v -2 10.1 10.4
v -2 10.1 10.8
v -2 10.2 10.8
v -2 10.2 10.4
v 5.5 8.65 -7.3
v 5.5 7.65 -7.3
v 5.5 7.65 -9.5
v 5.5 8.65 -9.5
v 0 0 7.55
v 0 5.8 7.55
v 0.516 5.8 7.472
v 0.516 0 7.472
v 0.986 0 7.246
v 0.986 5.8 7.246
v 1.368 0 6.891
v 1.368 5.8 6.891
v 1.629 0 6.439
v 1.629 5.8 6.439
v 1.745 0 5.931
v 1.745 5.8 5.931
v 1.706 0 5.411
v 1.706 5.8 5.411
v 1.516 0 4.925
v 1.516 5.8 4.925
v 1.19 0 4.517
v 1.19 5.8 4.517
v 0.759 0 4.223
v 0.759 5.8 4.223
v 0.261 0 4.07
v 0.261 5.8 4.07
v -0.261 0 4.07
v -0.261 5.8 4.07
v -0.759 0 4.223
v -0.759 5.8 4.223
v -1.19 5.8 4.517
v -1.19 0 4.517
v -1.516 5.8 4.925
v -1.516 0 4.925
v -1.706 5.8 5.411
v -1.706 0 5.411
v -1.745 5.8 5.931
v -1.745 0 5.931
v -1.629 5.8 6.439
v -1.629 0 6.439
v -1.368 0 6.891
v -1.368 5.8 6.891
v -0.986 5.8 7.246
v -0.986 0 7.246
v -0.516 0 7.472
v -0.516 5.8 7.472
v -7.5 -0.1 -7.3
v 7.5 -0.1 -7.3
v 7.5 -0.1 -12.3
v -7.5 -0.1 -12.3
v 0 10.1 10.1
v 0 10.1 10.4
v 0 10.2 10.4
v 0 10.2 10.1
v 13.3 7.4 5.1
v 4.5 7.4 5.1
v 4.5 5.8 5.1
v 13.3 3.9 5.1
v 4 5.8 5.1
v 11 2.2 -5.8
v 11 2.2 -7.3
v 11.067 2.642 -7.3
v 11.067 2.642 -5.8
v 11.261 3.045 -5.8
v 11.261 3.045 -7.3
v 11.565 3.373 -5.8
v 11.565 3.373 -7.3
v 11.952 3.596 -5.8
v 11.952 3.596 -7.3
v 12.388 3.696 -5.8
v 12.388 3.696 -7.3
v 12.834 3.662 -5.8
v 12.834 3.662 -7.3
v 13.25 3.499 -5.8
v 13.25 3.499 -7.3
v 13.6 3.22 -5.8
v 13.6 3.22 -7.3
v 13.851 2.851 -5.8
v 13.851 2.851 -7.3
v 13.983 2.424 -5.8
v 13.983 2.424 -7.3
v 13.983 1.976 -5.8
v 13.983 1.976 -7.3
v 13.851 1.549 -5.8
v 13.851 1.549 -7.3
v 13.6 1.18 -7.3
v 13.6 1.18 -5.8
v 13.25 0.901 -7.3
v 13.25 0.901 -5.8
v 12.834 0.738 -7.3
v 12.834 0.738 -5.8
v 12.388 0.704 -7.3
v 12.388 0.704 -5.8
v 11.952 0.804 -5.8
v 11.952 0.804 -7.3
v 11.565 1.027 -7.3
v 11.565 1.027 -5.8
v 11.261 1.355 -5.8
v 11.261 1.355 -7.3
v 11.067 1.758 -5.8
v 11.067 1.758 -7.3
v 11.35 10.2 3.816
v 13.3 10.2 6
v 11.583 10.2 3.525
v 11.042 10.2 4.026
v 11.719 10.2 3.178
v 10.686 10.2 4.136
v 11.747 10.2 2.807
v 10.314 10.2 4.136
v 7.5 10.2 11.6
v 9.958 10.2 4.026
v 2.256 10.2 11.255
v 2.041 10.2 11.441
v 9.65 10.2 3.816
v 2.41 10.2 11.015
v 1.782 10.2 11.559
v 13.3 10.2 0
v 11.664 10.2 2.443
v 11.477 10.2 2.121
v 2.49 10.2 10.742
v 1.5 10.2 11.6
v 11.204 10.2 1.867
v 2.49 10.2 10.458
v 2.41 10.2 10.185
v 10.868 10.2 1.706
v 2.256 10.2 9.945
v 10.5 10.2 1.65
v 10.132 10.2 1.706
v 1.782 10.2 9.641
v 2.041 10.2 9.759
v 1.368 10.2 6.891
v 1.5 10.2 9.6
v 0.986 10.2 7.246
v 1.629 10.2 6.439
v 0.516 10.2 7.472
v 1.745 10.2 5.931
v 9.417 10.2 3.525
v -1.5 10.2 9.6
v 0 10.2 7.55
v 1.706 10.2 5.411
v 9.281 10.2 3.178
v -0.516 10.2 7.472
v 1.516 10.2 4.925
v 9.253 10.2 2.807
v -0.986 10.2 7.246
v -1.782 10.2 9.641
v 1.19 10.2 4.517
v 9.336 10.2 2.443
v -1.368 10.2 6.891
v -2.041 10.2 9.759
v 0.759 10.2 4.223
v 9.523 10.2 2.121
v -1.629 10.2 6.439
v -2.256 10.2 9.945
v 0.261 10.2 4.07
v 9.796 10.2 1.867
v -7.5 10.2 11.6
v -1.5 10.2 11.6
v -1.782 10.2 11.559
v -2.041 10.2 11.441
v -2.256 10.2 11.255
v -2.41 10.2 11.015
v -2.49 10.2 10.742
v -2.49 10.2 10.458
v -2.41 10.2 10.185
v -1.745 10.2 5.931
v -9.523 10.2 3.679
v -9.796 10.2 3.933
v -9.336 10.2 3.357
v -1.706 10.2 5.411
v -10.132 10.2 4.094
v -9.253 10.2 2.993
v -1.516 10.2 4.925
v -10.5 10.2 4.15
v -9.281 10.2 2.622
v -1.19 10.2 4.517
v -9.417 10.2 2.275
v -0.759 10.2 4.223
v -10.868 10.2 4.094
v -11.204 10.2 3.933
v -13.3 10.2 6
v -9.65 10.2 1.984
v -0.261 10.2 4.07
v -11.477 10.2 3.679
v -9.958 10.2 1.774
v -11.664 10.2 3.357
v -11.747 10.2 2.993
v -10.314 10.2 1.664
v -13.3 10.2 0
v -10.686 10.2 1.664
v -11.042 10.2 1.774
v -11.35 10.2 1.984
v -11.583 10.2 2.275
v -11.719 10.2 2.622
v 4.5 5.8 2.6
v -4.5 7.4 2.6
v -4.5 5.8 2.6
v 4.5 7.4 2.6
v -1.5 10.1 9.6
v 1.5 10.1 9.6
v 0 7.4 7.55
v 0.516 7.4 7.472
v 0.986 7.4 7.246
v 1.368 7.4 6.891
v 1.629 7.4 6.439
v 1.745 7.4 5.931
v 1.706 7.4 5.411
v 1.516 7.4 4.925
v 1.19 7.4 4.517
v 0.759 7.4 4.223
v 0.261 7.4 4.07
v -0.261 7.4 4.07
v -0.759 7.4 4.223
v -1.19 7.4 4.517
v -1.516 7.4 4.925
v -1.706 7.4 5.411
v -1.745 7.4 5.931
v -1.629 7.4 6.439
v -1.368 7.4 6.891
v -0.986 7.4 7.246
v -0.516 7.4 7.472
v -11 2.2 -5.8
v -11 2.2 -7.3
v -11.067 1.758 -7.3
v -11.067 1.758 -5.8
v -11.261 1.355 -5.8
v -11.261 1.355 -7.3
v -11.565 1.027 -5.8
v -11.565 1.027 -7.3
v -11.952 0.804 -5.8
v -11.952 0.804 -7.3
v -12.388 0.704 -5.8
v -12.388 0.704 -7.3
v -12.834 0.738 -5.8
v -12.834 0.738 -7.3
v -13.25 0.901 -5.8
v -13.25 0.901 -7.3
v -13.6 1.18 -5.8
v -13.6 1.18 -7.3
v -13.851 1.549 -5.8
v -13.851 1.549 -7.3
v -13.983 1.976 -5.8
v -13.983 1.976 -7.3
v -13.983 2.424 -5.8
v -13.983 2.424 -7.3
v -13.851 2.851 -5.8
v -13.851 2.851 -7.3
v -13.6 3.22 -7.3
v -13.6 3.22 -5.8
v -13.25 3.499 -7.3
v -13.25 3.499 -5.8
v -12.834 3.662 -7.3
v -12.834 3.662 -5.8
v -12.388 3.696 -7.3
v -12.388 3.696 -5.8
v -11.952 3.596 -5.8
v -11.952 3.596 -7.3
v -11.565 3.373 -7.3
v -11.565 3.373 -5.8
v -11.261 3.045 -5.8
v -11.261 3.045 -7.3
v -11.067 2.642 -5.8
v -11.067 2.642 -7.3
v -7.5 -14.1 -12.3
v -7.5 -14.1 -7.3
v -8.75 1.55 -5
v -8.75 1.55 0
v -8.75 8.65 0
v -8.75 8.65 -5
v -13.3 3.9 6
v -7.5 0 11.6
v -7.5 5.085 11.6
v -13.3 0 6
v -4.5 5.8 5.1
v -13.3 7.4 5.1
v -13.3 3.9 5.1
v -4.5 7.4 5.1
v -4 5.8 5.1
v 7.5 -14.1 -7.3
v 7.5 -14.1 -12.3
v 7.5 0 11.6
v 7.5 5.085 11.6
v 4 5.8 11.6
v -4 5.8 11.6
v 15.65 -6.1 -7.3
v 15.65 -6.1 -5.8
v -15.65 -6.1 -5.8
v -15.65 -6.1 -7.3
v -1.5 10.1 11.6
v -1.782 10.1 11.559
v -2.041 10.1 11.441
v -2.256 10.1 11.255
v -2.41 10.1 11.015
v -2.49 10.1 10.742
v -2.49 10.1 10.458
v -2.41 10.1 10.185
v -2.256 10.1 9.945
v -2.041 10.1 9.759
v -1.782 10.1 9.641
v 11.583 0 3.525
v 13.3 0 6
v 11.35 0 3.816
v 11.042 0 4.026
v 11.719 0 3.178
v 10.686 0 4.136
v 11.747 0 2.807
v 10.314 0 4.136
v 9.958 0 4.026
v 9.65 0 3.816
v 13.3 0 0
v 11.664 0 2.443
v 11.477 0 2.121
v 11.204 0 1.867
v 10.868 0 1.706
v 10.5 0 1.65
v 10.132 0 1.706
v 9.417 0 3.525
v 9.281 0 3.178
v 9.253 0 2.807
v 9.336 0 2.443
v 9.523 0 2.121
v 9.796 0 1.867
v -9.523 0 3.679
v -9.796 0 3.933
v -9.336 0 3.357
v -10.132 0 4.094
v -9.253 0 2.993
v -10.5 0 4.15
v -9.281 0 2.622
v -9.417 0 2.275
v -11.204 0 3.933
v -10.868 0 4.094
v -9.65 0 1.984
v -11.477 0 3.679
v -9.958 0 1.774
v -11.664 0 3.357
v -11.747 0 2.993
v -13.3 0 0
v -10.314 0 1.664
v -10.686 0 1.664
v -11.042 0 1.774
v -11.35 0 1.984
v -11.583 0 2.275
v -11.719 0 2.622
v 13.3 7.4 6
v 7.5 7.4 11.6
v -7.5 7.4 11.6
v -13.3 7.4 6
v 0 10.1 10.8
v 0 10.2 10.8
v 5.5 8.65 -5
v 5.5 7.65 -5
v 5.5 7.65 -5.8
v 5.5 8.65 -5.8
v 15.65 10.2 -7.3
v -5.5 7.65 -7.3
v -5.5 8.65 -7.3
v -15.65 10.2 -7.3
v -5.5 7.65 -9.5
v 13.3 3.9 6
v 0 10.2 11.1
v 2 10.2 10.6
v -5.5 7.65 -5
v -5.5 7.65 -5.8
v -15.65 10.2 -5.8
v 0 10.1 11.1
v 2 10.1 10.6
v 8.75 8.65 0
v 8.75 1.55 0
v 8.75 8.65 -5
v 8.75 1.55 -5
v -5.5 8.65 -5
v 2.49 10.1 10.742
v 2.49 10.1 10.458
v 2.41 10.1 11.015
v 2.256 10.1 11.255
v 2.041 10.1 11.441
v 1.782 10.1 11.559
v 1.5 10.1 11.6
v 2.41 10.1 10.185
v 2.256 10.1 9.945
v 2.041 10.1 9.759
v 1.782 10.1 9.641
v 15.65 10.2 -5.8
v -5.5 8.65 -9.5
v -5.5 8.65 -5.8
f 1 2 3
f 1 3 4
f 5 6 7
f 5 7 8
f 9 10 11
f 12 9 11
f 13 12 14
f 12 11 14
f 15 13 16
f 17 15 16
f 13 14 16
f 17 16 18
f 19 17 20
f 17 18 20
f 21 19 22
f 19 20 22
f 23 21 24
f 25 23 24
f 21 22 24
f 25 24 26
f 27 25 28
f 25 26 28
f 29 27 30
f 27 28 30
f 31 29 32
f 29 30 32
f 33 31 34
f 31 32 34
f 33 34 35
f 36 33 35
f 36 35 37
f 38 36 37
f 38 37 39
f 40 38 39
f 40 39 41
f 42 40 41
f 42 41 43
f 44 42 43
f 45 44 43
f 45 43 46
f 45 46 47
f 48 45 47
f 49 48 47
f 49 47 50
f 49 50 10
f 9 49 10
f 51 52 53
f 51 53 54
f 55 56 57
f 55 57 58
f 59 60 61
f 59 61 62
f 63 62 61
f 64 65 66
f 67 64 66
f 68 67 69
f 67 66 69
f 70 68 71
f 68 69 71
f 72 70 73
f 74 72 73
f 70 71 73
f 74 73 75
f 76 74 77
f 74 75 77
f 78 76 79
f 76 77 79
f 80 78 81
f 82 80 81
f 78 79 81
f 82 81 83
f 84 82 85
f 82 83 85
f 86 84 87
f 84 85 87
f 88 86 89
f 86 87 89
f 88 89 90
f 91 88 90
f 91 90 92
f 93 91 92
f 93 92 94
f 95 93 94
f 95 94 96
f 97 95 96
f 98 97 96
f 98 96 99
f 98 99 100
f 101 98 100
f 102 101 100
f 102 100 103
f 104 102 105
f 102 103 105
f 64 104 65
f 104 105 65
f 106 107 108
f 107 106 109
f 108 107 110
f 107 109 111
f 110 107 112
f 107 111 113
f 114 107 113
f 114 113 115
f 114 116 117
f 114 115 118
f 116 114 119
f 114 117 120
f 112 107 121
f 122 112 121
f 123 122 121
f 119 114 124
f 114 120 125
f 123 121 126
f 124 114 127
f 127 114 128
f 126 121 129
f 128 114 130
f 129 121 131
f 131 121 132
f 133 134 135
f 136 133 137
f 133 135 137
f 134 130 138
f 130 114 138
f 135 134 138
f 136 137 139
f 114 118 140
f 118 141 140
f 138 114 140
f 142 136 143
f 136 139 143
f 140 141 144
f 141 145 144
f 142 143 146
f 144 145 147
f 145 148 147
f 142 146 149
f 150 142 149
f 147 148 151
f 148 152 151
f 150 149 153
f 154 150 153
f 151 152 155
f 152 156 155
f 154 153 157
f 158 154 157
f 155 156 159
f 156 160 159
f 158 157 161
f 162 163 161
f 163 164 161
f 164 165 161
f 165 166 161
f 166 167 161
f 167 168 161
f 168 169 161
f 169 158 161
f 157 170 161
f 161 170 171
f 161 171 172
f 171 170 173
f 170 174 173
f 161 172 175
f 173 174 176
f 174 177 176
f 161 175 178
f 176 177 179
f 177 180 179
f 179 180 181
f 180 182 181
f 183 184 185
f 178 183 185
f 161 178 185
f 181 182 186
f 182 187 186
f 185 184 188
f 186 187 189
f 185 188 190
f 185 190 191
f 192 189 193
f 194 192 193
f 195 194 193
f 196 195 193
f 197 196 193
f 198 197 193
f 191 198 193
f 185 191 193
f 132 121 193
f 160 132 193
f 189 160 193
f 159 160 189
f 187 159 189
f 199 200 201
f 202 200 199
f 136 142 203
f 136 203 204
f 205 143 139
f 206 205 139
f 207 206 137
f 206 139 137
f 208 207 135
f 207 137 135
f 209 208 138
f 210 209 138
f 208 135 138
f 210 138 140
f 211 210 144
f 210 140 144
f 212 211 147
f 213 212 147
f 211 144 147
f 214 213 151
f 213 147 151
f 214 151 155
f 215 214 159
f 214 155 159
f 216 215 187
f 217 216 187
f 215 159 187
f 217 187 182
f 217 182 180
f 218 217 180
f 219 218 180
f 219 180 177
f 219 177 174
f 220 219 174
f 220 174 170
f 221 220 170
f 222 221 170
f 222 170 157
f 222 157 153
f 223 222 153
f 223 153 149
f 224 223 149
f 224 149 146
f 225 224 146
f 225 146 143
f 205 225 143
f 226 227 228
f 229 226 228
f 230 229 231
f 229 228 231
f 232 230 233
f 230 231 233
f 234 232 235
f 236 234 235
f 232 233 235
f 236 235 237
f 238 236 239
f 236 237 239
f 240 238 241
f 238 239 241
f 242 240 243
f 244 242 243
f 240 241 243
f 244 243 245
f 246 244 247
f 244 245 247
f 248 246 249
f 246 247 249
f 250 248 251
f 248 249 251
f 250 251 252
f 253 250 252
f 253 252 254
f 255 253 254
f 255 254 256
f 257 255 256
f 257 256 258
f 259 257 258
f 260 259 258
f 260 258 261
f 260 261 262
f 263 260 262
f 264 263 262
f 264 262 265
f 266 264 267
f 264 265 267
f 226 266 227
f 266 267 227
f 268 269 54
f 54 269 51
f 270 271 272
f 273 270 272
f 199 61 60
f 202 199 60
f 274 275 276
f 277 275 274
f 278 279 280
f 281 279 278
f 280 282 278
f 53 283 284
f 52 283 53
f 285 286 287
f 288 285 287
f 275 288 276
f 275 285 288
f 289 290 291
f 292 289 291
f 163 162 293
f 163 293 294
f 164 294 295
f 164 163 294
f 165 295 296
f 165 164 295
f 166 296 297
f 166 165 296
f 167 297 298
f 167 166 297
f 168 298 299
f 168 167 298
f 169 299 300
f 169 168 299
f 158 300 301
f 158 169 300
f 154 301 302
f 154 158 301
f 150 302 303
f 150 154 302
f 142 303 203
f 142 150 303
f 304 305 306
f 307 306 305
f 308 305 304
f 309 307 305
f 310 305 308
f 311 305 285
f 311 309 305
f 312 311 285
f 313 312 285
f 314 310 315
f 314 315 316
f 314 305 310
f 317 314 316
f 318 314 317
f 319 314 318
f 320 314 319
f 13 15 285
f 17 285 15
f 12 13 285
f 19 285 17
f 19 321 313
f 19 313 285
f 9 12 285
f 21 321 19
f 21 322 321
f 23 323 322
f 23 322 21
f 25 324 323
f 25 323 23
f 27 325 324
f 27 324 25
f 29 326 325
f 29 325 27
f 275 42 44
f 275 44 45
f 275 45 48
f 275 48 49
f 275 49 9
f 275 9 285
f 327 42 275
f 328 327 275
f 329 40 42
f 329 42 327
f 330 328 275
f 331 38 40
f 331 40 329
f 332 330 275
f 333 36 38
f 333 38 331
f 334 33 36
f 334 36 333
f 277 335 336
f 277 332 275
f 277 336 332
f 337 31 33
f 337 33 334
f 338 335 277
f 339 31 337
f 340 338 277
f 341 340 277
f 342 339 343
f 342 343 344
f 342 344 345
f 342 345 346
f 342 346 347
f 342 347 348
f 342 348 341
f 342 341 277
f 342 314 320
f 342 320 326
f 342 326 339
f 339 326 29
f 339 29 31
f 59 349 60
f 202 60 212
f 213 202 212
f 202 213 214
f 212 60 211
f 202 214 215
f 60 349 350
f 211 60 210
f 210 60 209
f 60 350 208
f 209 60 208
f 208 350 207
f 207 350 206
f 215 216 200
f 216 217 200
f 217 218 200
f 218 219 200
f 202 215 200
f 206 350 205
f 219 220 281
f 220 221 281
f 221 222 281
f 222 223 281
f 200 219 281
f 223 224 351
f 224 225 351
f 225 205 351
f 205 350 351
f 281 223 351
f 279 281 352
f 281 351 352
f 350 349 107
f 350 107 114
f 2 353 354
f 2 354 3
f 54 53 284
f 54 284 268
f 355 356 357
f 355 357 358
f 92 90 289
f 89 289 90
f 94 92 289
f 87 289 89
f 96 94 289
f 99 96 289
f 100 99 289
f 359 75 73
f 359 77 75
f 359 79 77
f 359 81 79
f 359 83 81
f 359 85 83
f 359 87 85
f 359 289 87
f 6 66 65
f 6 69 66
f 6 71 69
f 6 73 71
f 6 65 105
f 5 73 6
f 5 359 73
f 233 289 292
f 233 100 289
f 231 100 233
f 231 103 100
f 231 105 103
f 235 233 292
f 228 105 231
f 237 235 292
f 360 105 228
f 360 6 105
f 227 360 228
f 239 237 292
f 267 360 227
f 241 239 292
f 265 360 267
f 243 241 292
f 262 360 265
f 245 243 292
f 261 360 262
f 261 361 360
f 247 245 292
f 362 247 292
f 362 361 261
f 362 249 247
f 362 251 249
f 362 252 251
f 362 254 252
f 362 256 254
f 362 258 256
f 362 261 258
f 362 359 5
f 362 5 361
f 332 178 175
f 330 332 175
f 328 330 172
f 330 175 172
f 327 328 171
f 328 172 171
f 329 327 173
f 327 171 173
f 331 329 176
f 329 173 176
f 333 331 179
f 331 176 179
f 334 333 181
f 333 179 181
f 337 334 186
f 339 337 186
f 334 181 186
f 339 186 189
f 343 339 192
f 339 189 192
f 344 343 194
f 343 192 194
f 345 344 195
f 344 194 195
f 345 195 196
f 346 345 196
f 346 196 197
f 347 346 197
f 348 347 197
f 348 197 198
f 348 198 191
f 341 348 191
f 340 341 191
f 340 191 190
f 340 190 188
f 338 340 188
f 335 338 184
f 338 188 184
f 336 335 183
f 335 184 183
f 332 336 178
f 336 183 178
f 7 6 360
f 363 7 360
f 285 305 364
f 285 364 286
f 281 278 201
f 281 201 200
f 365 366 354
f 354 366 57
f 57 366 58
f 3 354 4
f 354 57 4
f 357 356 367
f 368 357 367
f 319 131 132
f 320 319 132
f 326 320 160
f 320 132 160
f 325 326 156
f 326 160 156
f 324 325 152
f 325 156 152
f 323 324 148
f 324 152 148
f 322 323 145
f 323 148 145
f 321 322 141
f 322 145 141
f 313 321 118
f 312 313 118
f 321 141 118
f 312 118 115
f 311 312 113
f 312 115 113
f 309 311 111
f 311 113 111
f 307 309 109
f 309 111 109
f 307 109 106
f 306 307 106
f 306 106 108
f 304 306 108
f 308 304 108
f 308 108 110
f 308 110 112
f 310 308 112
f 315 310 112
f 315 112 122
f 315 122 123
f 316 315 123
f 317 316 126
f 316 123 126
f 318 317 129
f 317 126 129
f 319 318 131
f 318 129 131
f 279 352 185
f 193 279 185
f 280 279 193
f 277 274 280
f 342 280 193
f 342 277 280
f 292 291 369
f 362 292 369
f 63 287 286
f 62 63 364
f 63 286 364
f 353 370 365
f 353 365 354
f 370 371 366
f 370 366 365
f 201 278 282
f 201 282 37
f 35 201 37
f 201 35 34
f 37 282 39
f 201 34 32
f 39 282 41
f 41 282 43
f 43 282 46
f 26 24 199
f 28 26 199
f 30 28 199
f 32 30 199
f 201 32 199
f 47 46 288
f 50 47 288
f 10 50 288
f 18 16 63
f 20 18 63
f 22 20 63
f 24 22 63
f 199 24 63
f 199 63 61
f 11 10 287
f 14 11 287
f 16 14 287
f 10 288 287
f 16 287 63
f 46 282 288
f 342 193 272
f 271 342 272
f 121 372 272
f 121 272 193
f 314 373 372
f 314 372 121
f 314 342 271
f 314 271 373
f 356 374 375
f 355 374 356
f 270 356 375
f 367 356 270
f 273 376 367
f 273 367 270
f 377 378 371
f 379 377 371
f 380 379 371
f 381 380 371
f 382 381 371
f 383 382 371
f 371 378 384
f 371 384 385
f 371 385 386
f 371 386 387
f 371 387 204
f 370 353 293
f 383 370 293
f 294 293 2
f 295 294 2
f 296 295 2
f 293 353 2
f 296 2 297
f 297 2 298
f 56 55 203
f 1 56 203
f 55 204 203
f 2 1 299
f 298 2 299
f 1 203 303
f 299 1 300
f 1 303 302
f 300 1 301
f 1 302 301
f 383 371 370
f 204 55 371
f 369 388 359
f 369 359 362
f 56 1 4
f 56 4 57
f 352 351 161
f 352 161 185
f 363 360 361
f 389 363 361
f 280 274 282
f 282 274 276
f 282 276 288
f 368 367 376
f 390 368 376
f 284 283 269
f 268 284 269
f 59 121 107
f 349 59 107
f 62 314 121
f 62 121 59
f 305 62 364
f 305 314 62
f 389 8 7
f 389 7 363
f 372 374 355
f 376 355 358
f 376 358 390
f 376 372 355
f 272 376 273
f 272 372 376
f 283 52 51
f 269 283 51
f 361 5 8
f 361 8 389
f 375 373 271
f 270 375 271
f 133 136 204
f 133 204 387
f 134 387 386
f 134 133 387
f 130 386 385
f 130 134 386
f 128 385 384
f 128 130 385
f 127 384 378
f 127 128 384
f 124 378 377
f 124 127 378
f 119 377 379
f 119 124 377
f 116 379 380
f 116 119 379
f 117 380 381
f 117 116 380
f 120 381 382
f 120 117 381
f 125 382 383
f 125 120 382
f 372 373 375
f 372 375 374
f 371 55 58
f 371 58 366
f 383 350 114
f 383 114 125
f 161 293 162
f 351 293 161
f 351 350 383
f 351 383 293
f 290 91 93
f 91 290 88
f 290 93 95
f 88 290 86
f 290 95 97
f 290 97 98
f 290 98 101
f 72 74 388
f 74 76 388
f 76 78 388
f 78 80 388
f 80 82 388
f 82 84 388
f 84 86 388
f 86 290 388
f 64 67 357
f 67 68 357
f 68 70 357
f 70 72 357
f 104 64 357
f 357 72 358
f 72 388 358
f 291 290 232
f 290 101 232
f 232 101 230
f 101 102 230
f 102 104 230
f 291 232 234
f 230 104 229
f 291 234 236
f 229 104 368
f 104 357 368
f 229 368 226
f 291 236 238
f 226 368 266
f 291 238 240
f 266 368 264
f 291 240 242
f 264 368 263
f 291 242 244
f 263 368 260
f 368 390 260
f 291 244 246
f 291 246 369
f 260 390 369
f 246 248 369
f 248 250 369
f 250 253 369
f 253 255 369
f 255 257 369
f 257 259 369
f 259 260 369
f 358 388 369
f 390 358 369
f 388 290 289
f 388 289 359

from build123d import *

# Parameters (mm, degrees)
BOSS_EXTRUDE1_DEPTH = 10.2
SKETCH2_R           = 1.25
SKETCH2_R_2         = 1.75
CUT_EXTRUDE1_DEPTH  = 10.2
CUT_EXTRUDE2_DEPTH  = 6.5
SKETCH4_W           = 9
SKETCH4_H           = 1.6
CUT_EXTRUDE3_DEPTH  = 2.5
CUT_EXTRUDE4_DEPTH  = 0.1
BOSS_EXTRUDE2_DEPTH = 0.1
SKETCH7_W           = 17.5
SKETCH7_H           = 7.1
BOSS_EXTRUDE3_DEPTH = 5
SKETCH8_W           = 11
SKETCH8_H           = 1
BOSS_EXTRUDE4_DEPTH = 0.8
SKETCH10_W          = 31.3
SKETCH10_H          = 16.3
BOSS_EXTRUDE5_DEPTH = 1.5
SKETCH11_R          = 1.5
CUT_EXTRUDE5_DEPTH  = 1.5
SKETCH13_W          = 11
SKETCH13_H          = 1
BOSS_EXTRUDE6_DEPTH = 2.2
SKETCH14_W          = 15
SKETCH14_H          = 14
BOSS_EXTRUDE7_DEPTH = 5


with BuildPart() as part:
    # Sketch1 → Boss-Extrude1 (new body)
    with BuildSketch(Plane(origin=(0, 0, 0), x_dir=(1, 0, 0), z_dir=(0, 1, 0))):
        Polygon((-13.3, 0), (13.3, 0), (13.3, -6), (7.5, -11.6), (-7.5, -11.6), (-13.3, -6), align=None)
    extrude(amount=BOSS_EXTRUDE1_DEPTH)

    # Sketch2 → Cut-Extrude1 (cut)
    with BuildSketch(Plane(origin=(0, 10.2, 0), x_dir=(1, 0, 0), z_dir=(0, 1, 0))):
        with Locations(Location((-10.5, -2.9, 0), (0, 0, 270))):
            Circle(SKETCH2_R)
        with Locations(Location((10.5, -2.9, 0), (0, 0, 90))):
            Circle(SKETCH2_R)
        with Locations(Location((0, -5.8, 0), (0, 0, 270))):
            Circle(SKETCH2_R_2)
    extrude(amount=-CUT_EXTRUDE1_DEPTH, mode=Mode.SUBTRACT)

    # Sketch3 → Cut-Extrude2 (cut)
    with BuildSketch(Plane.XY.offset(11.6)):
        Polygon((-4, 5.8), (4, 5.8), (13.3, 3.9), (13.3, 7.4), (-13.3, 7.4), (-13.3, 3.9), align=None)
    extrude(amount=-CUT_EXTRUDE2_DEPTH, mode=Mode.SUBTRACT)

    # Sketch4 → Cut-Extrude3 (cut)
    with BuildSketch(Plane.XY.offset(5.1)):
        with Locations((0, 6.6)):
            Rectangle(SKETCH4_W, SKETCH4_H)
    extrude(amount=-CUT_EXTRUDE3_DEPTH, mode=Mode.SUBTRACT)

    # Sketch5 → Cut-Extrude4 (cut)
    with BuildSketch(Plane(origin=(0, 10.2, 0), x_dir=(1, 0, 0), z_dir=(0, 1, 0))):
        with BuildLine():
            Line((-1.5, -9.6), (1.5, -9.6))
            ThreePointArc((1.5, -9.6), (2.5, -10.6), (1.5, -11.6))
            Line((1.5, -11.6), (-1.5, -11.6))
            ThreePointArc((-1.5, -11.6), (-2.5, -10.6), (-1.5, -9.6))
        make_face()
    extrude(amount=-CUT_EXTRUDE4_DEPTH, mode=Mode.SUBTRACT)

    # Sketch6 → Boss-Extrude2 (add)
    with BuildSketch(Plane(origin=(0, 10.1, 0), x_dir=(1, 0, 0), z_dir=(0, 1, 0))):
        Polygon((0, -10.4), (0, -10.1), (2, -10.6), (0, -11.1), (0, -10.8), (-2, -10.8), (-2, -10.4), align=None)
    extrude(amount=BOSS_EXTRUDE2_DEPTH)

    # Sketch7 → Boss-Extrude3 (add)
    with BuildSketch(Plane(origin=(0, 0, 0), x_dir=(-1, 0, 0), z_dir=(0, 0, -1))):
        with Locations((0, 5.1)):
            Rectangle(SKETCH7_W, SKETCH7_H)
    extrude(amount=BOSS_EXTRUDE3_DEPTH)

    # Sketch8 → Boss-Extrude4 (add)
    with BuildSketch(Plane(origin=(0, 0, -5), x_dir=(-1, 0, 0), z_dir=(0, 0, -1))):
        with Locations((0, 8.15)):
            Rectangle(SKETCH8_W, SKETCH8_H)
    extrude(amount=BOSS_EXTRUDE4_DEPTH)

    # Sketch10 → Boss-Extrude5 (add)
    with BuildSketch(Plane(origin=(0, 0, -5.8), x_dir=(-1, 0, 0), z_dir=(0, 0, -1))):
        with Locations((0, 2.05)):
            Rectangle(SKETCH10_W, SKETCH10_H)
    extrude(amount=BOSS_EXTRUDE5_DEPTH)

    # Sketch11 → Cut-Extrude5 (cut)
    with BuildSketch(Plane(origin=(0, 0, -7.3), x_dir=(-1, 0, 0), z_dir=(0, 0, -1))):
        with Locations((-12.5, 2.2)):
            Circle(SKETCH11_R)
        with Locations(Location((12.5, 2.2, 0), (0, 0, 180))):
            Circle(SKETCH11_R)
    extrude(amount=-CUT_EXTRUDE5_DEPTH, mode=Mode.SUBTRACT)

    # Sketch13 → Boss-Extrude6 (add)
    with BuildSketch(Plane(origin=(0, 0, -7.3), x_dir=(-1, 0, 0), z_dir=(0, 0, -1))):
        with Locations((0, 8.15)):
            Rectangle(SKETCH13_W, SKETCH13_H)
    extrude(amount=BOSS_EXTRUDE6_DEPTH)


with BuildPart() as body_2:
    # Sketch14 → Boss-Extrude7 (new body)
    with BuildSketch(Plane(origin=(0, 0, -7.3), x_dir=(-1, 0, 0), z_dir=(0, 0, -1))):
        with Locations((0, -7.1)):
            Rectangle(SKETCH14_W, SKETCH14_H)
    extrude(amount=BOSS_EXTRUDE7_DEPTH)


solid = Compound([part.part, body_2.part])
